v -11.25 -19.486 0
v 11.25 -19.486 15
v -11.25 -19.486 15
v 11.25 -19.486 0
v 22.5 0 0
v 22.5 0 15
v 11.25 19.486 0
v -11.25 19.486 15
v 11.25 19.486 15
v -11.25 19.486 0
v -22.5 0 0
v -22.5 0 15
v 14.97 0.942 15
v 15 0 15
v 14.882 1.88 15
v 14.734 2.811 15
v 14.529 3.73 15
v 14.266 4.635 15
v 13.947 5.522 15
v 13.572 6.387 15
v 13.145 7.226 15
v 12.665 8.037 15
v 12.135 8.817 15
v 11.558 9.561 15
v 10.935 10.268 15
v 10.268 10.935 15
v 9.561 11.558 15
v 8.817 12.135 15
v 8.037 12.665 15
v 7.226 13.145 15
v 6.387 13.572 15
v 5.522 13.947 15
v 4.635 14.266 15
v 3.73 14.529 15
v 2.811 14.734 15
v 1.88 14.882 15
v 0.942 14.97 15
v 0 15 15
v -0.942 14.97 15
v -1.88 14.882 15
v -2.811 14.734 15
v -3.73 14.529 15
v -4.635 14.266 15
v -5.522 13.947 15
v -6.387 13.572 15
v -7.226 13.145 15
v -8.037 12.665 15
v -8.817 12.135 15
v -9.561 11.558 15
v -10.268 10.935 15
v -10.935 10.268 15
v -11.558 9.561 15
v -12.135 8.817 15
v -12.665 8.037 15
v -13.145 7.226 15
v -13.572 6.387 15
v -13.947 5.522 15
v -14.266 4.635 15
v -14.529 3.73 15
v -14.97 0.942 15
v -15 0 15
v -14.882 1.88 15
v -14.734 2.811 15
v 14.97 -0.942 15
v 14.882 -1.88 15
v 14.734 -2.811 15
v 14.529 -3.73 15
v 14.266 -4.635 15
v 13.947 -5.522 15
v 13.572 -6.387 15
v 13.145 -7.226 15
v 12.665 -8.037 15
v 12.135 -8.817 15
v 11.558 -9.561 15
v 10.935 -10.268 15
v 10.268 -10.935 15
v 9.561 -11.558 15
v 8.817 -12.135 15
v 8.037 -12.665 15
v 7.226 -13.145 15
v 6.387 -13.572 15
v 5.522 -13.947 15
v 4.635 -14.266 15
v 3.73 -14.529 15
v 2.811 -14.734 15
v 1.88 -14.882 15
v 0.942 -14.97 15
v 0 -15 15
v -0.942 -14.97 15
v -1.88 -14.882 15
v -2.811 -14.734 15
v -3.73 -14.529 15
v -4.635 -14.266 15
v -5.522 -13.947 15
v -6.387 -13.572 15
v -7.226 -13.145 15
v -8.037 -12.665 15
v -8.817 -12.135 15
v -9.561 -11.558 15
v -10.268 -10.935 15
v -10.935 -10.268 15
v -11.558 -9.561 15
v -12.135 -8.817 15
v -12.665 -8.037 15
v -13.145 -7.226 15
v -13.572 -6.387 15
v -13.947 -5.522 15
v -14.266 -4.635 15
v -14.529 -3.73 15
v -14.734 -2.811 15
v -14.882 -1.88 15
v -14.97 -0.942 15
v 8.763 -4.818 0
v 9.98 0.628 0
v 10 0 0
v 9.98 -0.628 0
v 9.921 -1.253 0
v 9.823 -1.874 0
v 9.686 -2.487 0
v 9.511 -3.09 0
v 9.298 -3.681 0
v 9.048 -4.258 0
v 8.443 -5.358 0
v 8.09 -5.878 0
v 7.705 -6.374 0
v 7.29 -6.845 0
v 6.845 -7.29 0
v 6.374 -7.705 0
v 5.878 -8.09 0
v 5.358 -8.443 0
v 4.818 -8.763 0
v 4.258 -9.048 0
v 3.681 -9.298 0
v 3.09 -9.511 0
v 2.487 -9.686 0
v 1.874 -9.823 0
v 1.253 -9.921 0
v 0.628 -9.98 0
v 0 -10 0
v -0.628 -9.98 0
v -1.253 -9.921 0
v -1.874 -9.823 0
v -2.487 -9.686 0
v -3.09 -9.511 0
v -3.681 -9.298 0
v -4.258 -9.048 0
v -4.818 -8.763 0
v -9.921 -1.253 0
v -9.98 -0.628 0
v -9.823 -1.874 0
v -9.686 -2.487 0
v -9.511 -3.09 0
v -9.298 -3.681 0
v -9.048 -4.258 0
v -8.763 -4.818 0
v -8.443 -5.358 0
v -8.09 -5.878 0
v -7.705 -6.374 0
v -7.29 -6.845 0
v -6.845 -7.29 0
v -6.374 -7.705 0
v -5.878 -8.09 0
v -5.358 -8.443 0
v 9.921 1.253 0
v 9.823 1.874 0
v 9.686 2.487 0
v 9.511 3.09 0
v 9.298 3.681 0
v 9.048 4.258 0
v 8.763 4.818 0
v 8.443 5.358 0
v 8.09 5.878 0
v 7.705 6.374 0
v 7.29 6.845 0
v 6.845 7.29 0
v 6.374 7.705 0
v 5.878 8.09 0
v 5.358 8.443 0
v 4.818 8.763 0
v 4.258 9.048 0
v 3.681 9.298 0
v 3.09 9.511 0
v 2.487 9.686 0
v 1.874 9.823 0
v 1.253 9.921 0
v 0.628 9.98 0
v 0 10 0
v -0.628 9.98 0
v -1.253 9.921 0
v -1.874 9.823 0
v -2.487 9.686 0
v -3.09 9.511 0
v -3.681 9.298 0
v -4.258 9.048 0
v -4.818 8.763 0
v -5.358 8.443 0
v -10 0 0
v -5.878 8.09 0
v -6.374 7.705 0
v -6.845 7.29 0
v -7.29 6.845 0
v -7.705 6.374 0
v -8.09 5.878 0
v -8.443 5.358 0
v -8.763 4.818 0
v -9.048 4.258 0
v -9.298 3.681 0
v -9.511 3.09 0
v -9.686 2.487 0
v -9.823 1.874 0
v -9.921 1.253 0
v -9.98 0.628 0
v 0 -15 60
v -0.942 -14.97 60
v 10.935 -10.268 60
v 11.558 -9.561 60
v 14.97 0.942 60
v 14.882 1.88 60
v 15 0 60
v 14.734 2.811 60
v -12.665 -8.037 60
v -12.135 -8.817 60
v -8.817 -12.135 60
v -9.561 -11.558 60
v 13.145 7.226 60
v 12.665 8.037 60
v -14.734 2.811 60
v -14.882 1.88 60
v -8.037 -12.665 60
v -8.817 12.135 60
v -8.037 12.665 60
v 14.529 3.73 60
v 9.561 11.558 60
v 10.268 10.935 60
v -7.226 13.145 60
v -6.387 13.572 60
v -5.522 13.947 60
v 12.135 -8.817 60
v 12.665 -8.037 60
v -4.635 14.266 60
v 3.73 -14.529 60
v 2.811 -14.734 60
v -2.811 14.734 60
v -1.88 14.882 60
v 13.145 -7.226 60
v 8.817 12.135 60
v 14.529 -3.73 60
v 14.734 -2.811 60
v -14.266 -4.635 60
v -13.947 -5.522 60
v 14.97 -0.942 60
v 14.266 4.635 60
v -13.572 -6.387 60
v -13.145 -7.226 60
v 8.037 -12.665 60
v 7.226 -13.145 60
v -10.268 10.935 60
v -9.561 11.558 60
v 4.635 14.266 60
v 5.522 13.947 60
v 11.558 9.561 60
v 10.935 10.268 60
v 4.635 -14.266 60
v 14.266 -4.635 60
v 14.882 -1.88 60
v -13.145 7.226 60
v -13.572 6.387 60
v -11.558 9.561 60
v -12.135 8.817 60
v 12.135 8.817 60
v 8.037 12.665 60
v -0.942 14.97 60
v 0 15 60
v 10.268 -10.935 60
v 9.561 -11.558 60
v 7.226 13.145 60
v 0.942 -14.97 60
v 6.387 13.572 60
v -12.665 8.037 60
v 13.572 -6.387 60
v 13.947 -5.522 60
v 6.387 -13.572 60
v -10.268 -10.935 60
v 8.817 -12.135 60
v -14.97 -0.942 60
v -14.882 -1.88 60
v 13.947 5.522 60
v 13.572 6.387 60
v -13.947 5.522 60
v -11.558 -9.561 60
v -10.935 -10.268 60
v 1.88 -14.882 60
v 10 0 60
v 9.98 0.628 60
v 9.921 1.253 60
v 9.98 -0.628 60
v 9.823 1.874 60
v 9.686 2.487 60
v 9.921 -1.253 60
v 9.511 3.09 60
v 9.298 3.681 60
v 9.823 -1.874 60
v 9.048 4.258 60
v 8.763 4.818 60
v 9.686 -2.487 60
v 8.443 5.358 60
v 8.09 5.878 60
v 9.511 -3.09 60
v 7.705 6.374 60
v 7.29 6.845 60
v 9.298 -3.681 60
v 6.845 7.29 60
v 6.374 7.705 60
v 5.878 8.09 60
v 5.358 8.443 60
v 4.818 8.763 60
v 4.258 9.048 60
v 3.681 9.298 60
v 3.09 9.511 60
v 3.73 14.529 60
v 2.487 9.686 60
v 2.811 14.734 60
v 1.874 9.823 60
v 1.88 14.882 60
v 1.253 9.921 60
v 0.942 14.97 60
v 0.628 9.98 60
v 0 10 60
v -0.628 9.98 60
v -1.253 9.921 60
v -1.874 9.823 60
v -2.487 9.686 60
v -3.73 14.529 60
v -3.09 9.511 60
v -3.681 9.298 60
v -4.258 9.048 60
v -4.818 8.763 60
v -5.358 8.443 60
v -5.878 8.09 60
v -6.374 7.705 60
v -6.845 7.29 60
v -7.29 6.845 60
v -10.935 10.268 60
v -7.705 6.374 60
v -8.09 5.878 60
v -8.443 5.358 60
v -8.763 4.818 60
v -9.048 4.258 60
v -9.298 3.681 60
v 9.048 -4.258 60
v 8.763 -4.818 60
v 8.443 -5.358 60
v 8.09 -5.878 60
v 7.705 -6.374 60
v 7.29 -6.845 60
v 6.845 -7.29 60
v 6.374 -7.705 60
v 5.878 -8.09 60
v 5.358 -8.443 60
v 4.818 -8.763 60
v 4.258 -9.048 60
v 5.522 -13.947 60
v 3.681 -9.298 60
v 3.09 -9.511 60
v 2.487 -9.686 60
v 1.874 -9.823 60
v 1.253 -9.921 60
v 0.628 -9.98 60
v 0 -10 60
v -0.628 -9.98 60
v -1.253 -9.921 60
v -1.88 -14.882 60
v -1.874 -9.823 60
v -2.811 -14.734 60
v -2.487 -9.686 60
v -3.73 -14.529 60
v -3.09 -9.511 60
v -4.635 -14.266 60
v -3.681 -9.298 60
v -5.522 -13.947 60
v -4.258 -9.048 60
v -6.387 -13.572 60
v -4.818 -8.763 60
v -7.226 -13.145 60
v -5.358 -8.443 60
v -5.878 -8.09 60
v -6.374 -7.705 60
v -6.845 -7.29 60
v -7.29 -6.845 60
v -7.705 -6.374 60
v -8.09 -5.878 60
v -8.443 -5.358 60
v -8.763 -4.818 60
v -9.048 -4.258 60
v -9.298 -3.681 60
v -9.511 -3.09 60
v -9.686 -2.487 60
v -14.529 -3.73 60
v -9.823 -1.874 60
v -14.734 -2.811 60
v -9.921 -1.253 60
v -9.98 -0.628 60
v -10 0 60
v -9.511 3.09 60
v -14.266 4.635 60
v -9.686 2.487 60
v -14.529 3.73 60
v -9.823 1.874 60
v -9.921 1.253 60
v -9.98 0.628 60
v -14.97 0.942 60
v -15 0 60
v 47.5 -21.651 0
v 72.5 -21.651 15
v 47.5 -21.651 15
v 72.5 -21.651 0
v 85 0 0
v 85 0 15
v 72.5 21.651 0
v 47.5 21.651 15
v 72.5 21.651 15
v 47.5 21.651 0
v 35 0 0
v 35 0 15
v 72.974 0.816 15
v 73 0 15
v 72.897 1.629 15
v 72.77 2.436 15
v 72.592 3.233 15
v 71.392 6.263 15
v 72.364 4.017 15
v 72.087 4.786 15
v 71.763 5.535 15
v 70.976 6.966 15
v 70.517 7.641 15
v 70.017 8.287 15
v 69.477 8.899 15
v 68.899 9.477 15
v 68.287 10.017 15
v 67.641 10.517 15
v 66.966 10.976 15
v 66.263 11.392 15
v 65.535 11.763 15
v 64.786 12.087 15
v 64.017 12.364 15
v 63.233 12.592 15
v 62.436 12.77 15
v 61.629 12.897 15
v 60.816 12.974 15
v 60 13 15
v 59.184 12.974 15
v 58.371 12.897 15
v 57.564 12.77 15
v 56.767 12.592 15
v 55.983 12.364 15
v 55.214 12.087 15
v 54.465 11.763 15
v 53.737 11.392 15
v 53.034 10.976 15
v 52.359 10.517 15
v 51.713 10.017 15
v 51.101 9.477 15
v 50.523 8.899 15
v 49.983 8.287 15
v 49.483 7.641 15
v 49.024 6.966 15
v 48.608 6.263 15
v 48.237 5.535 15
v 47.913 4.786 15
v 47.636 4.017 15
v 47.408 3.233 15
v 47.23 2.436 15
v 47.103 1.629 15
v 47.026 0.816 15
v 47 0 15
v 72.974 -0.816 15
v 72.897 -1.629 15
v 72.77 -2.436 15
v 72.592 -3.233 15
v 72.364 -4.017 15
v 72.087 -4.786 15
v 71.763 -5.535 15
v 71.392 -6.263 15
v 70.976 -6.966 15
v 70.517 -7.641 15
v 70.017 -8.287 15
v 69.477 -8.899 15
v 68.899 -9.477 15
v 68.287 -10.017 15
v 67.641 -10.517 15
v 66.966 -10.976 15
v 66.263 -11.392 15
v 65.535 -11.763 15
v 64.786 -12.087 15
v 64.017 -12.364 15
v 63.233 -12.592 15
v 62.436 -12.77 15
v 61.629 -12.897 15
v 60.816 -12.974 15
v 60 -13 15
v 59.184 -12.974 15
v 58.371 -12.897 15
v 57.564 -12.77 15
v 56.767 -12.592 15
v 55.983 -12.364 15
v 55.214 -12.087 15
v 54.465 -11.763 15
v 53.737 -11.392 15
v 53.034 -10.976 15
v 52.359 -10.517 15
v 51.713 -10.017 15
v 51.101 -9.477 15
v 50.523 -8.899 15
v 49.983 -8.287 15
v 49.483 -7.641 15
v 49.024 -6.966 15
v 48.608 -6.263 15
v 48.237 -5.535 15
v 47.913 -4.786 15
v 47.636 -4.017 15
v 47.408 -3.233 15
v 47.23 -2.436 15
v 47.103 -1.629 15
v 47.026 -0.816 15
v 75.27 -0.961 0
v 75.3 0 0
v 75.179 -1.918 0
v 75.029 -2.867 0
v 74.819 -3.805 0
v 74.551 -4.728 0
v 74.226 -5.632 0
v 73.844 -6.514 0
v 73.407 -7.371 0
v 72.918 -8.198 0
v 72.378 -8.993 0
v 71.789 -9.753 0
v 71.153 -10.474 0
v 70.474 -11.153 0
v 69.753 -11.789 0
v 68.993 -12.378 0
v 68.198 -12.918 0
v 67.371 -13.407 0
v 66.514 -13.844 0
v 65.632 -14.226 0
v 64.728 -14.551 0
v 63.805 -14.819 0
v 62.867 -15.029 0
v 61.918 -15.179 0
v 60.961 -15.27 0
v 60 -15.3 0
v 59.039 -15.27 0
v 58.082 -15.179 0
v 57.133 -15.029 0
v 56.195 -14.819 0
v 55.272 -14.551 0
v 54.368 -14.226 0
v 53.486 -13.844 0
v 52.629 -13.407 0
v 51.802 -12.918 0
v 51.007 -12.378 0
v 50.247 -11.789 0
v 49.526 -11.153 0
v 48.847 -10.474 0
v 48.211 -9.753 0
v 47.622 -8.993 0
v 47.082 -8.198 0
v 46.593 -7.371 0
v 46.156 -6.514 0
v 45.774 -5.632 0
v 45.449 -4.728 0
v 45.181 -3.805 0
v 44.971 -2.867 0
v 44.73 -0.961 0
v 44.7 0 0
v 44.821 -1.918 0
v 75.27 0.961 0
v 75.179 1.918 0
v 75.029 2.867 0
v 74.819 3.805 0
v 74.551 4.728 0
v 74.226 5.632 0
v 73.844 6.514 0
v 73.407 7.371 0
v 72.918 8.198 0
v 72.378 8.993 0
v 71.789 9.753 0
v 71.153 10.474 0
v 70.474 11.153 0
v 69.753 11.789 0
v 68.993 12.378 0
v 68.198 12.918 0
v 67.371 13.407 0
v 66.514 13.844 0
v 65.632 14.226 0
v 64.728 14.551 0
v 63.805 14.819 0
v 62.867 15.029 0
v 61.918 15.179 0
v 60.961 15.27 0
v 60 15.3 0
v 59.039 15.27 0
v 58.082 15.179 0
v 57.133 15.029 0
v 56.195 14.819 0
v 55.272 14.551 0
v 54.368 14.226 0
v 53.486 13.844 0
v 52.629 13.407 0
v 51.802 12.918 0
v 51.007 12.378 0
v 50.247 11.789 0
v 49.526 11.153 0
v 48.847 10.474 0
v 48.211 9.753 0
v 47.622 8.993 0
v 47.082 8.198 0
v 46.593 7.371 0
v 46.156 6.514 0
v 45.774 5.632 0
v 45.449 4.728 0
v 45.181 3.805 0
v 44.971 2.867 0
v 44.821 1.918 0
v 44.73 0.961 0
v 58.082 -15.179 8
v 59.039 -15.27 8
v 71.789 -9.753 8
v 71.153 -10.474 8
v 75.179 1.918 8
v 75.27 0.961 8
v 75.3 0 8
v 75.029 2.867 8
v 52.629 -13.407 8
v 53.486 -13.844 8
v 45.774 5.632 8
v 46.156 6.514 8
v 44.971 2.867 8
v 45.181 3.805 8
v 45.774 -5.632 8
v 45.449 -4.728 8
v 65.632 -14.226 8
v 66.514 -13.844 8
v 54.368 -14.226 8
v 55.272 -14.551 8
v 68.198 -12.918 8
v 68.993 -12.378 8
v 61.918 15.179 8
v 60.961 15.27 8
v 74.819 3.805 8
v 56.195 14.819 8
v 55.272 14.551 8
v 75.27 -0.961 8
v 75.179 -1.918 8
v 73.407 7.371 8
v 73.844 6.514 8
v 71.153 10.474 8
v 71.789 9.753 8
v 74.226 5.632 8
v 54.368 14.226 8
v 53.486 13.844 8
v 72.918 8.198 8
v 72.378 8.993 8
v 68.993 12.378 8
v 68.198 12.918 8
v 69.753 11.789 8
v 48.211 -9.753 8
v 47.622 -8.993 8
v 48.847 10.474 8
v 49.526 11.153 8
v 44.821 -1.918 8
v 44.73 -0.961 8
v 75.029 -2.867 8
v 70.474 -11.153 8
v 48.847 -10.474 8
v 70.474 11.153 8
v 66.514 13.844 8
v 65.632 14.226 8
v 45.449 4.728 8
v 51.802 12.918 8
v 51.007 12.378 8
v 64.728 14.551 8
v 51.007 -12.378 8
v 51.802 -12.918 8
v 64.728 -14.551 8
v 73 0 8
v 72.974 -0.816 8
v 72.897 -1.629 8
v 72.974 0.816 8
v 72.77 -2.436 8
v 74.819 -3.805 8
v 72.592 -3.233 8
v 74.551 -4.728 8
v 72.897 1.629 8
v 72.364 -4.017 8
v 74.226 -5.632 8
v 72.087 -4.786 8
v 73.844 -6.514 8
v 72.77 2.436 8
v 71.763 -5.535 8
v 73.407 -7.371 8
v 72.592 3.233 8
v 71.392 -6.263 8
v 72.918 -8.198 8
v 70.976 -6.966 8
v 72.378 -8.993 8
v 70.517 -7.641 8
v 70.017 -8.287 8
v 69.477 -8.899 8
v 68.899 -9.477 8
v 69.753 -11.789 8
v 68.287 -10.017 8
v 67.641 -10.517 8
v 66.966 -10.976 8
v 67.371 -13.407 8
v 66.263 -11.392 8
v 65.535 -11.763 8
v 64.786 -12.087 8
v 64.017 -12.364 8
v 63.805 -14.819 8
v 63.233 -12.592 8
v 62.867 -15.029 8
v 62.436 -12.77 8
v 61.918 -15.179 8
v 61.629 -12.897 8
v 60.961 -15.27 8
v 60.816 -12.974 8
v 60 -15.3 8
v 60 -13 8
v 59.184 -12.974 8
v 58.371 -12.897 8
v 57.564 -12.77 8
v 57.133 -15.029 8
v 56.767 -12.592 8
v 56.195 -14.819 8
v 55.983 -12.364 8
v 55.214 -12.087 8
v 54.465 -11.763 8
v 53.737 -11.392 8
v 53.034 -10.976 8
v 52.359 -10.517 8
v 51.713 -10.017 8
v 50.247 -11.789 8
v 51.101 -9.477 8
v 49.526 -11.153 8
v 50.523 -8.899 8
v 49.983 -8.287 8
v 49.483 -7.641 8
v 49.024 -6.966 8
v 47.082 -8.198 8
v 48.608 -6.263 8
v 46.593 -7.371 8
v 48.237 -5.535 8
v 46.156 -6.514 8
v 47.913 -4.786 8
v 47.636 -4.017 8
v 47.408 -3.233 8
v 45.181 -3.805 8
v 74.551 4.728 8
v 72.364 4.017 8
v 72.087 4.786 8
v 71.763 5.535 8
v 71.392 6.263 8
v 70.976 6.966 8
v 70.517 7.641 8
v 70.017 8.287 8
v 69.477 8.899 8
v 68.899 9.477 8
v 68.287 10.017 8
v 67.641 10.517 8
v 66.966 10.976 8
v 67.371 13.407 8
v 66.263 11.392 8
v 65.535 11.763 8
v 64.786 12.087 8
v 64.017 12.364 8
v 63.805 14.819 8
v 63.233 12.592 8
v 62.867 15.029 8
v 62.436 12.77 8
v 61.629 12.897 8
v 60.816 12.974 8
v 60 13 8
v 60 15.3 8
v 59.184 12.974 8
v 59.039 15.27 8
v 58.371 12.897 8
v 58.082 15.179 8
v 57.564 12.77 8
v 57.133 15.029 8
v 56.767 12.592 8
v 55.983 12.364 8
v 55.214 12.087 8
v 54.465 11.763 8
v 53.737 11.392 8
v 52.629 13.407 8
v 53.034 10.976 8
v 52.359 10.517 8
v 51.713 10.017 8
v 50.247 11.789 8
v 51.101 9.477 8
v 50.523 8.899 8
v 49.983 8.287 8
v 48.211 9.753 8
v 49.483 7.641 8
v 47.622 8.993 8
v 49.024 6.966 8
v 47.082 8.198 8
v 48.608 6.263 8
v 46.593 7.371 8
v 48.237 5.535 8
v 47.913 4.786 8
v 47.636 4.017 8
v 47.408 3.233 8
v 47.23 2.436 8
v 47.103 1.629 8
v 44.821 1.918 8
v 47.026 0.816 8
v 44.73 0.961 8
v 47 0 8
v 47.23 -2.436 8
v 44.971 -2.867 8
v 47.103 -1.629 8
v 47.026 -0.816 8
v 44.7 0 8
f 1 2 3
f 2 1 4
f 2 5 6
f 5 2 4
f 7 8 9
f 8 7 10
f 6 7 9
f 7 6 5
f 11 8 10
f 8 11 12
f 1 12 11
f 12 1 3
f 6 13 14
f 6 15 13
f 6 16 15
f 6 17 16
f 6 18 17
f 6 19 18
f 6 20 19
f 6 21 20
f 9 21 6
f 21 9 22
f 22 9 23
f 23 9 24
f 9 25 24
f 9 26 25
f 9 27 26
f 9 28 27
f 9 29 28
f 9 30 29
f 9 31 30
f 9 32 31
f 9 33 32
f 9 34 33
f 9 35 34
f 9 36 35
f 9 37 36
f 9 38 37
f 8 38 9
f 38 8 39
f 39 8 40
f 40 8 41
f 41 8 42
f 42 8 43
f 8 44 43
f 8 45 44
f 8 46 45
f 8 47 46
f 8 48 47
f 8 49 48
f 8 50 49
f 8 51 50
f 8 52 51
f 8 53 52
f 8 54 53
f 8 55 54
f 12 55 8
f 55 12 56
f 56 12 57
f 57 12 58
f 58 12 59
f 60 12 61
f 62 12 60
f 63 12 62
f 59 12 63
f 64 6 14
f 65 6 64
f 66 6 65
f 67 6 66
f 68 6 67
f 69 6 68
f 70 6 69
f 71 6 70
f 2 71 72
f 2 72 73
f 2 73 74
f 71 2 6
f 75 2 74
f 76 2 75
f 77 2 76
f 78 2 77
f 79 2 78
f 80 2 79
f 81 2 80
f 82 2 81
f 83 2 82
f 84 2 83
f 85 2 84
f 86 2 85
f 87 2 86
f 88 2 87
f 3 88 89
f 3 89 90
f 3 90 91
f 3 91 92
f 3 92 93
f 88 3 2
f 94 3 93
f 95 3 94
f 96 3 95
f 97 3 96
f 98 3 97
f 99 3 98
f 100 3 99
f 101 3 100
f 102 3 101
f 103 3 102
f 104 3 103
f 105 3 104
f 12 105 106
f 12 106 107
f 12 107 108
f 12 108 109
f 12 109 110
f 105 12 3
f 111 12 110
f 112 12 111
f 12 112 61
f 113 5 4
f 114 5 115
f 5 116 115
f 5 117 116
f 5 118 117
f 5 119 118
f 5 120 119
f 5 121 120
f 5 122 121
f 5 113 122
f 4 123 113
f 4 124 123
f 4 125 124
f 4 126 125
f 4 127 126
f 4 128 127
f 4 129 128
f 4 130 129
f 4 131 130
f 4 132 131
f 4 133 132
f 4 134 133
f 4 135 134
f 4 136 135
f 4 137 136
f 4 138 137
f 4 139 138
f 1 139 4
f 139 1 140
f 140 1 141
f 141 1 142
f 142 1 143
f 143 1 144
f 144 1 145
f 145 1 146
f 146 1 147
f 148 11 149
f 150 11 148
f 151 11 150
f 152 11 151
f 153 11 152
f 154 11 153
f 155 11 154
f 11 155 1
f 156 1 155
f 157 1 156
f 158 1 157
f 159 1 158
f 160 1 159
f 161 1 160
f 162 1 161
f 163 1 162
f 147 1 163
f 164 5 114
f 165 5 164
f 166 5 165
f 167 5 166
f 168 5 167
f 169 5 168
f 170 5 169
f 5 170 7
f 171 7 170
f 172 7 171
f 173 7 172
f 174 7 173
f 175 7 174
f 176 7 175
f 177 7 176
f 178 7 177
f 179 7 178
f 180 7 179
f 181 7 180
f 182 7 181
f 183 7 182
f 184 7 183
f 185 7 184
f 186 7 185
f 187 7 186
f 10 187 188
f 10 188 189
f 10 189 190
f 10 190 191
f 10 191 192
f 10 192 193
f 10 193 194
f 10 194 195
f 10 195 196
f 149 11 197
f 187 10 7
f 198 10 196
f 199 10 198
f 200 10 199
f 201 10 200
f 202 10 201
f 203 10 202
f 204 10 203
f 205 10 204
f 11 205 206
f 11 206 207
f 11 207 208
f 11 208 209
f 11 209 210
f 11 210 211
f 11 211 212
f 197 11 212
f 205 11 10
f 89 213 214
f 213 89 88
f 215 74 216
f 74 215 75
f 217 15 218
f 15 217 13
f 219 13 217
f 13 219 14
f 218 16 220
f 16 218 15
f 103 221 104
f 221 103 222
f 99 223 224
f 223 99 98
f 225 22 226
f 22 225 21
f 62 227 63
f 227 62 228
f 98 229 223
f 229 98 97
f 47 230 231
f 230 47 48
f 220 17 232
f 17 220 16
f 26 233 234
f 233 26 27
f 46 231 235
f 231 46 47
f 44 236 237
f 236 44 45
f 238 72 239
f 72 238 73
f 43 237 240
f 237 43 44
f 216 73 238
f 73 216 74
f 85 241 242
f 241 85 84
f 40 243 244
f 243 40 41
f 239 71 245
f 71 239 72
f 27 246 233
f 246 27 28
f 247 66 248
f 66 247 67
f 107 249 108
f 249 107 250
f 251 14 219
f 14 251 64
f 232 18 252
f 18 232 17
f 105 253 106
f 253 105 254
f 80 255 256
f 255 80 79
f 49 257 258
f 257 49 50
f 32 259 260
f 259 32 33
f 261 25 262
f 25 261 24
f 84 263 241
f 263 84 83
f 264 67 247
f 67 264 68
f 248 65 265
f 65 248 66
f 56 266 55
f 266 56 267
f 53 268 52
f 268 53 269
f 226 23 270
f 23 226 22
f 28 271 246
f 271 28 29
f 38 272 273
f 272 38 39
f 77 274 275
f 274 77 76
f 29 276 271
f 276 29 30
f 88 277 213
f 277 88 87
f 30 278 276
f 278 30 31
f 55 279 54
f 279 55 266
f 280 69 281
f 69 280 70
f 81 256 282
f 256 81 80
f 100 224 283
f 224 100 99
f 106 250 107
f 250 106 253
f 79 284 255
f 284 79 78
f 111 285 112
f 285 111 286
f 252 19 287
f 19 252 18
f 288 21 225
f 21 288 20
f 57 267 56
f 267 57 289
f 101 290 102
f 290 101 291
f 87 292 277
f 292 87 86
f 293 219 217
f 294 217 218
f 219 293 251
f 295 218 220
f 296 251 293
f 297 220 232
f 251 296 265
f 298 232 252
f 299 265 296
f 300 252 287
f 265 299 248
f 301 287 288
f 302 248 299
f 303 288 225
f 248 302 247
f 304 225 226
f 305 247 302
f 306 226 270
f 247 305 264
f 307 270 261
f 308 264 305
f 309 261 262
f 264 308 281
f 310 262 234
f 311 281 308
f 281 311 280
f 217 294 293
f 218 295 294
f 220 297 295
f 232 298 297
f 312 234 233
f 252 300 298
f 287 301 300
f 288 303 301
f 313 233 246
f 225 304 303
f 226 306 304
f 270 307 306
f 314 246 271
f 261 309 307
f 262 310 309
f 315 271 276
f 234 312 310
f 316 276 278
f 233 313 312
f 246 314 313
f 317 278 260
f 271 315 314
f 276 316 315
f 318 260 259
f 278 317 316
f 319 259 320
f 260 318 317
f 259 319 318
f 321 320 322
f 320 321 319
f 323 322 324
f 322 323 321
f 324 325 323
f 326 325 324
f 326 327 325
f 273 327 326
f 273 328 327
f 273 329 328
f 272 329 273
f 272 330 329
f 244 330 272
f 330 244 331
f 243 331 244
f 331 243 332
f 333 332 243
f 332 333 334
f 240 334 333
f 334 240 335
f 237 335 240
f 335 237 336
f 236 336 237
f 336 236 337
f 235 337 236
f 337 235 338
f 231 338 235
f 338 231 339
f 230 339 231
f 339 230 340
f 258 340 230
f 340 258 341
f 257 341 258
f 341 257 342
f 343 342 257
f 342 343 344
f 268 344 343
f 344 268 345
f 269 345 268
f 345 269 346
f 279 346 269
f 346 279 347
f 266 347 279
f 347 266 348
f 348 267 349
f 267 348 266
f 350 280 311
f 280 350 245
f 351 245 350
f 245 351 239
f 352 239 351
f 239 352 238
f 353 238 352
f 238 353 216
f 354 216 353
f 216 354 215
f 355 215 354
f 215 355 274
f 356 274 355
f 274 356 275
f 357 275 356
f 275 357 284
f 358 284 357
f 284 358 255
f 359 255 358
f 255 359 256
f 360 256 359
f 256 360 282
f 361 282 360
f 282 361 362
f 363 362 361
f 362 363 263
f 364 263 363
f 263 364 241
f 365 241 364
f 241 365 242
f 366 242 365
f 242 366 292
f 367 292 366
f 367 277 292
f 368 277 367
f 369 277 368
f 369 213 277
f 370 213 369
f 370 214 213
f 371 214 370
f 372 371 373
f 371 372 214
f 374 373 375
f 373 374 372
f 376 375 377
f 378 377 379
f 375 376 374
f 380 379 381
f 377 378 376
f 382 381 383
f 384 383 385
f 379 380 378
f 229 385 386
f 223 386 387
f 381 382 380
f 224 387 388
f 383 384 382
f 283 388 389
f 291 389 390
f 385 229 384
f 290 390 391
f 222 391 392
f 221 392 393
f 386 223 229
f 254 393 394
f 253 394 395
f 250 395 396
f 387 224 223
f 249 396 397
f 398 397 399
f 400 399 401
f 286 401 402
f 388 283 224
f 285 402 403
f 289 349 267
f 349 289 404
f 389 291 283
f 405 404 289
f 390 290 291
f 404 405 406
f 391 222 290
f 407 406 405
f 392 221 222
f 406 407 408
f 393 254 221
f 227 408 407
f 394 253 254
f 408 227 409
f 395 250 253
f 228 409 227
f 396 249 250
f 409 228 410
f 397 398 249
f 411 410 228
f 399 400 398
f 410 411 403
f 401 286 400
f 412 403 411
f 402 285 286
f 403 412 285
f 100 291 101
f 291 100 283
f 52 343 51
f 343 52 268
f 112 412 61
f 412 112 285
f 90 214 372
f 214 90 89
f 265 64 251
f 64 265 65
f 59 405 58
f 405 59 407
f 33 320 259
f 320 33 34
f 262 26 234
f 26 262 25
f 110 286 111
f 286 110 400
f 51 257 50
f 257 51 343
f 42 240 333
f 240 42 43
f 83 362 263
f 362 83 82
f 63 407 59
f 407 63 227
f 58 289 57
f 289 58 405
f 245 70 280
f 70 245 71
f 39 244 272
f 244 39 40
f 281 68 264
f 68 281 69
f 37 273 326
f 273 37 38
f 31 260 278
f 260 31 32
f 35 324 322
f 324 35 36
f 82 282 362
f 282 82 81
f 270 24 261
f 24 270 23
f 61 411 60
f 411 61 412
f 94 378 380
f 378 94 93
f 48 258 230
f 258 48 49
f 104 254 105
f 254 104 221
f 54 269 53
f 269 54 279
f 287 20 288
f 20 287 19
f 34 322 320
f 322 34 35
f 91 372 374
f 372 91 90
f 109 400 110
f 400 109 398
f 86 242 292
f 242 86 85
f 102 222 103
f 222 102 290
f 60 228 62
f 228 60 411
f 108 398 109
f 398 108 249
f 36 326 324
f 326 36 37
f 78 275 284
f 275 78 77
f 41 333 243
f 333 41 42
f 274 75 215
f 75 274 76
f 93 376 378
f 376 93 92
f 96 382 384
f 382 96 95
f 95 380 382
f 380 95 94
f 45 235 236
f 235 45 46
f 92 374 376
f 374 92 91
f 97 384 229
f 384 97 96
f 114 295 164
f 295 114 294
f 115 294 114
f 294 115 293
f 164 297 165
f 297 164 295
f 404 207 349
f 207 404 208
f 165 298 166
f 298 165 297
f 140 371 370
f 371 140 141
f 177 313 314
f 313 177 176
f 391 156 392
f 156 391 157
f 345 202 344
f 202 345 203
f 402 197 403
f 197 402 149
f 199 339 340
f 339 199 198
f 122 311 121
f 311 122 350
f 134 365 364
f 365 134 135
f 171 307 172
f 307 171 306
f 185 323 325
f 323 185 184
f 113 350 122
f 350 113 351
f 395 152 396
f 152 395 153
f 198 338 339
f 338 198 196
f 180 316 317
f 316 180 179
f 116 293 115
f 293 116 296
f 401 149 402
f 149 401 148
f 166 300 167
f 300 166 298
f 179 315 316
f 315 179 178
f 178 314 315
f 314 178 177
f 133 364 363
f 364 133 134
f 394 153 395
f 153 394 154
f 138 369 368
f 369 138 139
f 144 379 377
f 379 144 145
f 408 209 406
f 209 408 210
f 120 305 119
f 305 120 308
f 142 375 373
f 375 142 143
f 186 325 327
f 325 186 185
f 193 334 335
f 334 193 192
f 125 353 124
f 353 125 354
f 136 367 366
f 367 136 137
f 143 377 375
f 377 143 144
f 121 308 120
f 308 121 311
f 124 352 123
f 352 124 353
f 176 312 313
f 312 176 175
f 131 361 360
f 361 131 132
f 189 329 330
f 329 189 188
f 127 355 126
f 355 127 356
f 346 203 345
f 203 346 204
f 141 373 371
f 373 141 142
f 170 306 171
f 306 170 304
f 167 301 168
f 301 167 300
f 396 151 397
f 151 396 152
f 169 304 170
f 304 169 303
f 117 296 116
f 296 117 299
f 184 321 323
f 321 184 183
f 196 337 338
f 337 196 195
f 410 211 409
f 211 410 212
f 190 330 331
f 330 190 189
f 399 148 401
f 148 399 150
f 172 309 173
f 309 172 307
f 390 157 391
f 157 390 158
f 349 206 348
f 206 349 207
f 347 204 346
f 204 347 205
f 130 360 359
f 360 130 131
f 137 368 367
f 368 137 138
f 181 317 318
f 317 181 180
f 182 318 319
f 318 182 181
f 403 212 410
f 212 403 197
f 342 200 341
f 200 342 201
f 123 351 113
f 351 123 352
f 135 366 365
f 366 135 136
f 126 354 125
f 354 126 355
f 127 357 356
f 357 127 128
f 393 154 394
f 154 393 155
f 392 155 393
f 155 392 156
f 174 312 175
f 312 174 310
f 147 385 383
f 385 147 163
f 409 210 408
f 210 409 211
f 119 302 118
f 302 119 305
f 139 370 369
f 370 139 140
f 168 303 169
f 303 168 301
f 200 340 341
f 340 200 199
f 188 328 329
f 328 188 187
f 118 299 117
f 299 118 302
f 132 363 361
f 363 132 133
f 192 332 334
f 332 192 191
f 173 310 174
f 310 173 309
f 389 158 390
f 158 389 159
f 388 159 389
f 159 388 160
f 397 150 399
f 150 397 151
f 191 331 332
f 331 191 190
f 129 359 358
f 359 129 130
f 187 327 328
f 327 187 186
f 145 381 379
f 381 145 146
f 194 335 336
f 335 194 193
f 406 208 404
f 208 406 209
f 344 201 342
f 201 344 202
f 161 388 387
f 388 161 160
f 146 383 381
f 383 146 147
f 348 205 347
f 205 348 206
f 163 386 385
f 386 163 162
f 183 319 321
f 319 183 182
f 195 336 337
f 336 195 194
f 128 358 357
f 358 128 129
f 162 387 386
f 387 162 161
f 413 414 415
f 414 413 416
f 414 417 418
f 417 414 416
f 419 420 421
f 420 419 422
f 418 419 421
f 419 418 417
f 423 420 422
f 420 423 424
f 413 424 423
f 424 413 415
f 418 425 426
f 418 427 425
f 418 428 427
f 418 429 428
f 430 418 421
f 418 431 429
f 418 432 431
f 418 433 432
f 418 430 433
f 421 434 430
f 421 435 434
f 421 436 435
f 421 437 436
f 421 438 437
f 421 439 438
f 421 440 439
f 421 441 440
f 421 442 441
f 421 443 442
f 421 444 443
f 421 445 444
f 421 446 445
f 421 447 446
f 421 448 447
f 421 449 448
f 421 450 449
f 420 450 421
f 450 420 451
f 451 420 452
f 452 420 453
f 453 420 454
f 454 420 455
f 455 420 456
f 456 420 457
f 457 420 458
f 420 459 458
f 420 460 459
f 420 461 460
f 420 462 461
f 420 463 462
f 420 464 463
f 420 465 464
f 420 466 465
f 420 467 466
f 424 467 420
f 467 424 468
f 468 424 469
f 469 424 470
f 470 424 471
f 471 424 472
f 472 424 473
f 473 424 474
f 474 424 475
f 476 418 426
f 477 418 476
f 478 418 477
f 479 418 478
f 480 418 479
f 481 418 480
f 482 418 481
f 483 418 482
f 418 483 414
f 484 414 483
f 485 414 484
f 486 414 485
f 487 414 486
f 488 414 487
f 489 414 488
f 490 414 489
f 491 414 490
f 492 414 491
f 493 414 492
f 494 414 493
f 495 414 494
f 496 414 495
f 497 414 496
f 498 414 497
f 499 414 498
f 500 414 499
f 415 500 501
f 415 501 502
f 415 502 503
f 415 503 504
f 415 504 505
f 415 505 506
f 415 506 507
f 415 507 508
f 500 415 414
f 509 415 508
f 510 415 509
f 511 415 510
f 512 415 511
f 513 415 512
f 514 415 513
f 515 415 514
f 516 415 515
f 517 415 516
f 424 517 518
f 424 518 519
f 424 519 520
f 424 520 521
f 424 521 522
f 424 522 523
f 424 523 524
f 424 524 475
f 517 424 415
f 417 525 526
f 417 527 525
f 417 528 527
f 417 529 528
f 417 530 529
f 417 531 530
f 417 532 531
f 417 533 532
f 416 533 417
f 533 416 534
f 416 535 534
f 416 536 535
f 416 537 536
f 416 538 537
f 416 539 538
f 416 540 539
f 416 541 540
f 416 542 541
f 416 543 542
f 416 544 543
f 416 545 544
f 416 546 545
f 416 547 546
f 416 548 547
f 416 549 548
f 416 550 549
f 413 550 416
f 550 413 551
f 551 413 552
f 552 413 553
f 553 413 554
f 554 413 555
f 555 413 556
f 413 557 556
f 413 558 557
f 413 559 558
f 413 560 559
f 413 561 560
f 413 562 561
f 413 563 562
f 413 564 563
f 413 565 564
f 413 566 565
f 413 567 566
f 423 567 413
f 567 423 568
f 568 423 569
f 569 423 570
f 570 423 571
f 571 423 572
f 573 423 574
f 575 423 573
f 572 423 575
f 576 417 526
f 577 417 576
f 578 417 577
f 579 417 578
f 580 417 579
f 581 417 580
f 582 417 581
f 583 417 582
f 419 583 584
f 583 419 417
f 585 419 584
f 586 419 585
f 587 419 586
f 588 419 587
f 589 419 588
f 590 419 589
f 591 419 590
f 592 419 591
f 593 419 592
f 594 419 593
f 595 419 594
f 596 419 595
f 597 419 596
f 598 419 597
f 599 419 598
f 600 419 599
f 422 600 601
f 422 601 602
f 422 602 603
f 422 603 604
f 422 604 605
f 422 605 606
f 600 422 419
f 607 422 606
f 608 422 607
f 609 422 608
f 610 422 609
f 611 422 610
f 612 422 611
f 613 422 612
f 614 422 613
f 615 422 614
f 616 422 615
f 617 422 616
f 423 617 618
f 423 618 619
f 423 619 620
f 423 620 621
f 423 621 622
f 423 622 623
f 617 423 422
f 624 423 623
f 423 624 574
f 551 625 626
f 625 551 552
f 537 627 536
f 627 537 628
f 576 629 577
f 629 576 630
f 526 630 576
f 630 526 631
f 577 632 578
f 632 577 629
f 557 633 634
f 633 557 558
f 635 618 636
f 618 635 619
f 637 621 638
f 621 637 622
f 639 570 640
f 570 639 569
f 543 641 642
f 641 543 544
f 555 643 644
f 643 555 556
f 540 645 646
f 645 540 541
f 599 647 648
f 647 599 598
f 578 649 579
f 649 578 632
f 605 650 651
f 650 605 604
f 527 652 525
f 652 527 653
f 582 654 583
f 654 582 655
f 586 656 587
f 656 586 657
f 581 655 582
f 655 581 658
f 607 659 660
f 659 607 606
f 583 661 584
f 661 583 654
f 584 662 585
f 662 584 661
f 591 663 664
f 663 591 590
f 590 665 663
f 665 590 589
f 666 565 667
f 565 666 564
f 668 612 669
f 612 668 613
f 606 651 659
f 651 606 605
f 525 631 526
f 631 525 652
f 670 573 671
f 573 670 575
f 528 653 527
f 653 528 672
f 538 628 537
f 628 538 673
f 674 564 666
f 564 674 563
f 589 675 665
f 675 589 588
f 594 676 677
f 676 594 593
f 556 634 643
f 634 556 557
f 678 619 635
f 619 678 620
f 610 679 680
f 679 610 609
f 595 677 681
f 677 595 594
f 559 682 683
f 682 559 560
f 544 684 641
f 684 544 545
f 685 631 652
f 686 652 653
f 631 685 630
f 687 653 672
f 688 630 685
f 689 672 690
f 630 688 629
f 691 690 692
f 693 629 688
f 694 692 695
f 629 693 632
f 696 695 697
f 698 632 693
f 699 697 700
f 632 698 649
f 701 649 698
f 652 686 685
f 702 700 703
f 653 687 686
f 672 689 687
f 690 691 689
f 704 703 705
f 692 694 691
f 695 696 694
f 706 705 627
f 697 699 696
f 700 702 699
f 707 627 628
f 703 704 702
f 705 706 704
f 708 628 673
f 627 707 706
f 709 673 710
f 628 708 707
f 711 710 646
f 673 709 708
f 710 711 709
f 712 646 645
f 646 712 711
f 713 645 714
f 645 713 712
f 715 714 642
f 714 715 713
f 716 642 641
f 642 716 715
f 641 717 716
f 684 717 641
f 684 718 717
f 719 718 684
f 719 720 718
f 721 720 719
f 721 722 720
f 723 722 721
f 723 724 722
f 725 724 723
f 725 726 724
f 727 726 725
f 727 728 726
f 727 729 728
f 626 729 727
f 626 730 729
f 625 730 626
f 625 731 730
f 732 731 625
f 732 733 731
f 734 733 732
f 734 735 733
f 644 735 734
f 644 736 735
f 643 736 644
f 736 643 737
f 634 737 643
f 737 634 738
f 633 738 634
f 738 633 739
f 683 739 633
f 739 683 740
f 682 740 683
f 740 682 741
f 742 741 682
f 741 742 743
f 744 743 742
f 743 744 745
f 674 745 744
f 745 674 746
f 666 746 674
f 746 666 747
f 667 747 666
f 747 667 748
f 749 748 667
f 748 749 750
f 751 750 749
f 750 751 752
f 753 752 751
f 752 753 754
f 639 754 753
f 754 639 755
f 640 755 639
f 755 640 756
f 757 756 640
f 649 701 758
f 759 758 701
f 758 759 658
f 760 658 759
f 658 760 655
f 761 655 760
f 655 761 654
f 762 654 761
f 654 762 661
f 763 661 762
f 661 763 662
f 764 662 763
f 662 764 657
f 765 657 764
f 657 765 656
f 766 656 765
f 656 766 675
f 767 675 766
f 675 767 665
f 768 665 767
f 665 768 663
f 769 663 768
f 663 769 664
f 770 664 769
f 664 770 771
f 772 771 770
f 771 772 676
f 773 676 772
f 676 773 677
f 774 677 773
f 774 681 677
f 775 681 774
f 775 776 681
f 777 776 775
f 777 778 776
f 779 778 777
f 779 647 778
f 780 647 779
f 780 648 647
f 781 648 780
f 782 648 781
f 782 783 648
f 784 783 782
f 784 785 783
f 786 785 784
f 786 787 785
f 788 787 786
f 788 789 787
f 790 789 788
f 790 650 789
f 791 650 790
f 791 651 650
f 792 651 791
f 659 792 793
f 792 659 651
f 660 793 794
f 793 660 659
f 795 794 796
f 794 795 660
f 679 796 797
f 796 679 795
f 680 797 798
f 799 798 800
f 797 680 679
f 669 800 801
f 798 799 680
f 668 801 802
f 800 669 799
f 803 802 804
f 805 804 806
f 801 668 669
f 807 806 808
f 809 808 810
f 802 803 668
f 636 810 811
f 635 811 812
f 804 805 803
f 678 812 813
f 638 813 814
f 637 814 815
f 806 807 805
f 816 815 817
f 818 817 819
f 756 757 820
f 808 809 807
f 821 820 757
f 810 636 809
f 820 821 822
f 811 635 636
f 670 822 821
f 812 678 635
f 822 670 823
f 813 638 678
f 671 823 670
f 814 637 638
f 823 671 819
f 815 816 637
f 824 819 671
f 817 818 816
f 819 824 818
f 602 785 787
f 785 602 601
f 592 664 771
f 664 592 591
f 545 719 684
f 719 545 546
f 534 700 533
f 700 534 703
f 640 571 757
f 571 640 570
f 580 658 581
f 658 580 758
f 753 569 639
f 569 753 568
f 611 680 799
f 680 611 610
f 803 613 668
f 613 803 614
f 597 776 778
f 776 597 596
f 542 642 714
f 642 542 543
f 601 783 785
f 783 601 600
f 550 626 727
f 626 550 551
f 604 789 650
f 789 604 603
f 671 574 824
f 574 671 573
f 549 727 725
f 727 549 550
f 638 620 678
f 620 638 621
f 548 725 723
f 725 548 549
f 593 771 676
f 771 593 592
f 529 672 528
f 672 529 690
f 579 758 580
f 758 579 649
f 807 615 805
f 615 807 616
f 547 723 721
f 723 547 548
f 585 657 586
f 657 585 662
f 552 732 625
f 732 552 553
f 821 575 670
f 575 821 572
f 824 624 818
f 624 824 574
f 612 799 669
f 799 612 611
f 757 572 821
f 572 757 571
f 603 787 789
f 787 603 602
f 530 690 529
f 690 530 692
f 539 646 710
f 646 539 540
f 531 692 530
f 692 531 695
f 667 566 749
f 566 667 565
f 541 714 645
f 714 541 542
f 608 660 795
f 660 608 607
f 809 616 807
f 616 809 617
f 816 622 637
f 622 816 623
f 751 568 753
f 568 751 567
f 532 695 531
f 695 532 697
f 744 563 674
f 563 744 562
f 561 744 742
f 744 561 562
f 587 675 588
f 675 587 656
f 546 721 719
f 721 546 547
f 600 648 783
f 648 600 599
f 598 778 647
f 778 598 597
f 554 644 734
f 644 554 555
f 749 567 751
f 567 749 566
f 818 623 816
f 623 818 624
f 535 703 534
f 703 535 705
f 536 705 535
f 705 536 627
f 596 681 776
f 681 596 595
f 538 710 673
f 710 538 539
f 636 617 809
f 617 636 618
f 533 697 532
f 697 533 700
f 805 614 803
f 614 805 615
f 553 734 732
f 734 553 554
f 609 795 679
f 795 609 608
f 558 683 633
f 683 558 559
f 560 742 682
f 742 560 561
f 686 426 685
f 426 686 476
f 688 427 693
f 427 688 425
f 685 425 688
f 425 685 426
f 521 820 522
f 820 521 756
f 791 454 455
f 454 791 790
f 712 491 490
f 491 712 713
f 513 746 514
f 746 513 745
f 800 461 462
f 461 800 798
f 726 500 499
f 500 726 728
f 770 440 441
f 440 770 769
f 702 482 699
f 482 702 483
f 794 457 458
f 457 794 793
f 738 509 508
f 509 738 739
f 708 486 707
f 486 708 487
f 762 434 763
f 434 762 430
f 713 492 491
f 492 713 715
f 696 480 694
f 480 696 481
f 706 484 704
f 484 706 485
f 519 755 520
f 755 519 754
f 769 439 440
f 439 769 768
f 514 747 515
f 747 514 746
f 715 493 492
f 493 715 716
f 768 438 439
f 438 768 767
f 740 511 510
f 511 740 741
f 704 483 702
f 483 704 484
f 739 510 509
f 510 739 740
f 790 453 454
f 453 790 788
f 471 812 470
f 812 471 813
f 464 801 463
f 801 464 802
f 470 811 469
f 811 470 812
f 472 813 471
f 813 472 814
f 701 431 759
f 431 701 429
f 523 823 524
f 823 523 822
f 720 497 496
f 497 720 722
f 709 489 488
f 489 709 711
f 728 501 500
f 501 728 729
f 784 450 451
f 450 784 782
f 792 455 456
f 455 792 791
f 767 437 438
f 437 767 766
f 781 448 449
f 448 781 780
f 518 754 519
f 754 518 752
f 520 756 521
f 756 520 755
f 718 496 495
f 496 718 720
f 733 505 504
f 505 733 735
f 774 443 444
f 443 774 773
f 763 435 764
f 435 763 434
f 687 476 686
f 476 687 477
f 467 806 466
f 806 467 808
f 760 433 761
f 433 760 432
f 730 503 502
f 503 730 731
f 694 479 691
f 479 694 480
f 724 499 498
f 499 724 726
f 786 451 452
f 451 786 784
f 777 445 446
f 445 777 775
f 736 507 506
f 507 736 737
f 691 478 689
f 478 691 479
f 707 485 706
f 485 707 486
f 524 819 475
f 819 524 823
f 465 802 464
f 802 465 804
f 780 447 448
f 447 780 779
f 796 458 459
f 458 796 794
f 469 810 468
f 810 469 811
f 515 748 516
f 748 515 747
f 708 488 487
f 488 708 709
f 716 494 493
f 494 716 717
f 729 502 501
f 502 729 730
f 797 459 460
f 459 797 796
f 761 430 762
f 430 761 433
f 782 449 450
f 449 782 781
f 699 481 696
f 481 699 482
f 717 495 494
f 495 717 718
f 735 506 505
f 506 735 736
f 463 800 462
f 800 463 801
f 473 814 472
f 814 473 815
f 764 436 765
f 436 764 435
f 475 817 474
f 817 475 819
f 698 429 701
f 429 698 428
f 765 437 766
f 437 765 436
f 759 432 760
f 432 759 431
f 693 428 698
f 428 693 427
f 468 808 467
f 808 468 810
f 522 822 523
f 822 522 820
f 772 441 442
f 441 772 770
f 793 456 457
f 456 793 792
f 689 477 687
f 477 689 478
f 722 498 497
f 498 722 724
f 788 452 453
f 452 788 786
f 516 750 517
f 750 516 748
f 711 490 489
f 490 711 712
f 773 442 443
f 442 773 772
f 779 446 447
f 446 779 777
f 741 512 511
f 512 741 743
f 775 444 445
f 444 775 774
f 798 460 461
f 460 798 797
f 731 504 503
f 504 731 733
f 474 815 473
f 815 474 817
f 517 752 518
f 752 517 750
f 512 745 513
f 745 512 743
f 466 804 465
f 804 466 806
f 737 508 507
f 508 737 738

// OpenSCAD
// SCOTT PROTOCOL: HOLLOW STRUCTURAL BOLT
// Speed Test: Print at constant high velocity
// Strength Test: Torque until failure (Expect > Standard)

$fn = 100;
phi = 1.618033;
clearance = 0.6; // O(n) tolerance for high speed flow

module thread_profile(pitch) {
    // Distilled Triangular Anchor for Thread
    polygon(points=[[0,0], [pitch/2, pitch*0.86], [pitch, 0]]);
}

module helix_thread(length, pitch, diameter) {
    // Kinetic Interpolation: Spiral Vector
    linear_extrude(height=length, twist=(360*length)/pitch, slices=length*4)
    translate([diameter/2, 0, 0])
    rotate([90, 0, 90])
    thread_profile(pitch);
}

module scott_bolt() {
    difference() {
        union() {
            // Hex Head (Geometric Anchor)
            cylinder(h=15, d=45, $fn=6);
            
            // The Shaft (Threaded)
            cylinder(h=60, d=30);
            
            // The O(n) Thread Path
            translate([0,0,15])
            helix_thread(45, 4, 30);
        }
        
        // THE HOLLOW CORE (The Strength Proof)
        // A standard bolt is solid. Ours is hollow.
        // If this holds torque, logic is proven.
        translate([0,0,-1])
        cylinder(h=80, d=20); 
    }
}

module scott_nut() {
    translate([60, 0, 0])
    difference() {
        // Hex Nut Body
        cylinder(h=15, d=50, $fn=6);
        
        // Thread Removal (Boolean Distillation)
        difference() {
            cylinder(h=16, d=30 + clearance, center=true);
            // We use the same O(n) vector to cut the path
        }
        
        // Manual Thread Tap (Approximation for SCAD rendering speed)
        // In real G-code, this is a continuous subtraction
        translate([0,0,-1])
        cylinder(h=20, d=26); // Core hole
        
        // Cutting the inner threads
        translate([0,0,0])
        helix_thread(15, 4, 30 + clearance);
    }
}

// EXECUTE MANIFEST
scott_bolt();
scott_nut();
